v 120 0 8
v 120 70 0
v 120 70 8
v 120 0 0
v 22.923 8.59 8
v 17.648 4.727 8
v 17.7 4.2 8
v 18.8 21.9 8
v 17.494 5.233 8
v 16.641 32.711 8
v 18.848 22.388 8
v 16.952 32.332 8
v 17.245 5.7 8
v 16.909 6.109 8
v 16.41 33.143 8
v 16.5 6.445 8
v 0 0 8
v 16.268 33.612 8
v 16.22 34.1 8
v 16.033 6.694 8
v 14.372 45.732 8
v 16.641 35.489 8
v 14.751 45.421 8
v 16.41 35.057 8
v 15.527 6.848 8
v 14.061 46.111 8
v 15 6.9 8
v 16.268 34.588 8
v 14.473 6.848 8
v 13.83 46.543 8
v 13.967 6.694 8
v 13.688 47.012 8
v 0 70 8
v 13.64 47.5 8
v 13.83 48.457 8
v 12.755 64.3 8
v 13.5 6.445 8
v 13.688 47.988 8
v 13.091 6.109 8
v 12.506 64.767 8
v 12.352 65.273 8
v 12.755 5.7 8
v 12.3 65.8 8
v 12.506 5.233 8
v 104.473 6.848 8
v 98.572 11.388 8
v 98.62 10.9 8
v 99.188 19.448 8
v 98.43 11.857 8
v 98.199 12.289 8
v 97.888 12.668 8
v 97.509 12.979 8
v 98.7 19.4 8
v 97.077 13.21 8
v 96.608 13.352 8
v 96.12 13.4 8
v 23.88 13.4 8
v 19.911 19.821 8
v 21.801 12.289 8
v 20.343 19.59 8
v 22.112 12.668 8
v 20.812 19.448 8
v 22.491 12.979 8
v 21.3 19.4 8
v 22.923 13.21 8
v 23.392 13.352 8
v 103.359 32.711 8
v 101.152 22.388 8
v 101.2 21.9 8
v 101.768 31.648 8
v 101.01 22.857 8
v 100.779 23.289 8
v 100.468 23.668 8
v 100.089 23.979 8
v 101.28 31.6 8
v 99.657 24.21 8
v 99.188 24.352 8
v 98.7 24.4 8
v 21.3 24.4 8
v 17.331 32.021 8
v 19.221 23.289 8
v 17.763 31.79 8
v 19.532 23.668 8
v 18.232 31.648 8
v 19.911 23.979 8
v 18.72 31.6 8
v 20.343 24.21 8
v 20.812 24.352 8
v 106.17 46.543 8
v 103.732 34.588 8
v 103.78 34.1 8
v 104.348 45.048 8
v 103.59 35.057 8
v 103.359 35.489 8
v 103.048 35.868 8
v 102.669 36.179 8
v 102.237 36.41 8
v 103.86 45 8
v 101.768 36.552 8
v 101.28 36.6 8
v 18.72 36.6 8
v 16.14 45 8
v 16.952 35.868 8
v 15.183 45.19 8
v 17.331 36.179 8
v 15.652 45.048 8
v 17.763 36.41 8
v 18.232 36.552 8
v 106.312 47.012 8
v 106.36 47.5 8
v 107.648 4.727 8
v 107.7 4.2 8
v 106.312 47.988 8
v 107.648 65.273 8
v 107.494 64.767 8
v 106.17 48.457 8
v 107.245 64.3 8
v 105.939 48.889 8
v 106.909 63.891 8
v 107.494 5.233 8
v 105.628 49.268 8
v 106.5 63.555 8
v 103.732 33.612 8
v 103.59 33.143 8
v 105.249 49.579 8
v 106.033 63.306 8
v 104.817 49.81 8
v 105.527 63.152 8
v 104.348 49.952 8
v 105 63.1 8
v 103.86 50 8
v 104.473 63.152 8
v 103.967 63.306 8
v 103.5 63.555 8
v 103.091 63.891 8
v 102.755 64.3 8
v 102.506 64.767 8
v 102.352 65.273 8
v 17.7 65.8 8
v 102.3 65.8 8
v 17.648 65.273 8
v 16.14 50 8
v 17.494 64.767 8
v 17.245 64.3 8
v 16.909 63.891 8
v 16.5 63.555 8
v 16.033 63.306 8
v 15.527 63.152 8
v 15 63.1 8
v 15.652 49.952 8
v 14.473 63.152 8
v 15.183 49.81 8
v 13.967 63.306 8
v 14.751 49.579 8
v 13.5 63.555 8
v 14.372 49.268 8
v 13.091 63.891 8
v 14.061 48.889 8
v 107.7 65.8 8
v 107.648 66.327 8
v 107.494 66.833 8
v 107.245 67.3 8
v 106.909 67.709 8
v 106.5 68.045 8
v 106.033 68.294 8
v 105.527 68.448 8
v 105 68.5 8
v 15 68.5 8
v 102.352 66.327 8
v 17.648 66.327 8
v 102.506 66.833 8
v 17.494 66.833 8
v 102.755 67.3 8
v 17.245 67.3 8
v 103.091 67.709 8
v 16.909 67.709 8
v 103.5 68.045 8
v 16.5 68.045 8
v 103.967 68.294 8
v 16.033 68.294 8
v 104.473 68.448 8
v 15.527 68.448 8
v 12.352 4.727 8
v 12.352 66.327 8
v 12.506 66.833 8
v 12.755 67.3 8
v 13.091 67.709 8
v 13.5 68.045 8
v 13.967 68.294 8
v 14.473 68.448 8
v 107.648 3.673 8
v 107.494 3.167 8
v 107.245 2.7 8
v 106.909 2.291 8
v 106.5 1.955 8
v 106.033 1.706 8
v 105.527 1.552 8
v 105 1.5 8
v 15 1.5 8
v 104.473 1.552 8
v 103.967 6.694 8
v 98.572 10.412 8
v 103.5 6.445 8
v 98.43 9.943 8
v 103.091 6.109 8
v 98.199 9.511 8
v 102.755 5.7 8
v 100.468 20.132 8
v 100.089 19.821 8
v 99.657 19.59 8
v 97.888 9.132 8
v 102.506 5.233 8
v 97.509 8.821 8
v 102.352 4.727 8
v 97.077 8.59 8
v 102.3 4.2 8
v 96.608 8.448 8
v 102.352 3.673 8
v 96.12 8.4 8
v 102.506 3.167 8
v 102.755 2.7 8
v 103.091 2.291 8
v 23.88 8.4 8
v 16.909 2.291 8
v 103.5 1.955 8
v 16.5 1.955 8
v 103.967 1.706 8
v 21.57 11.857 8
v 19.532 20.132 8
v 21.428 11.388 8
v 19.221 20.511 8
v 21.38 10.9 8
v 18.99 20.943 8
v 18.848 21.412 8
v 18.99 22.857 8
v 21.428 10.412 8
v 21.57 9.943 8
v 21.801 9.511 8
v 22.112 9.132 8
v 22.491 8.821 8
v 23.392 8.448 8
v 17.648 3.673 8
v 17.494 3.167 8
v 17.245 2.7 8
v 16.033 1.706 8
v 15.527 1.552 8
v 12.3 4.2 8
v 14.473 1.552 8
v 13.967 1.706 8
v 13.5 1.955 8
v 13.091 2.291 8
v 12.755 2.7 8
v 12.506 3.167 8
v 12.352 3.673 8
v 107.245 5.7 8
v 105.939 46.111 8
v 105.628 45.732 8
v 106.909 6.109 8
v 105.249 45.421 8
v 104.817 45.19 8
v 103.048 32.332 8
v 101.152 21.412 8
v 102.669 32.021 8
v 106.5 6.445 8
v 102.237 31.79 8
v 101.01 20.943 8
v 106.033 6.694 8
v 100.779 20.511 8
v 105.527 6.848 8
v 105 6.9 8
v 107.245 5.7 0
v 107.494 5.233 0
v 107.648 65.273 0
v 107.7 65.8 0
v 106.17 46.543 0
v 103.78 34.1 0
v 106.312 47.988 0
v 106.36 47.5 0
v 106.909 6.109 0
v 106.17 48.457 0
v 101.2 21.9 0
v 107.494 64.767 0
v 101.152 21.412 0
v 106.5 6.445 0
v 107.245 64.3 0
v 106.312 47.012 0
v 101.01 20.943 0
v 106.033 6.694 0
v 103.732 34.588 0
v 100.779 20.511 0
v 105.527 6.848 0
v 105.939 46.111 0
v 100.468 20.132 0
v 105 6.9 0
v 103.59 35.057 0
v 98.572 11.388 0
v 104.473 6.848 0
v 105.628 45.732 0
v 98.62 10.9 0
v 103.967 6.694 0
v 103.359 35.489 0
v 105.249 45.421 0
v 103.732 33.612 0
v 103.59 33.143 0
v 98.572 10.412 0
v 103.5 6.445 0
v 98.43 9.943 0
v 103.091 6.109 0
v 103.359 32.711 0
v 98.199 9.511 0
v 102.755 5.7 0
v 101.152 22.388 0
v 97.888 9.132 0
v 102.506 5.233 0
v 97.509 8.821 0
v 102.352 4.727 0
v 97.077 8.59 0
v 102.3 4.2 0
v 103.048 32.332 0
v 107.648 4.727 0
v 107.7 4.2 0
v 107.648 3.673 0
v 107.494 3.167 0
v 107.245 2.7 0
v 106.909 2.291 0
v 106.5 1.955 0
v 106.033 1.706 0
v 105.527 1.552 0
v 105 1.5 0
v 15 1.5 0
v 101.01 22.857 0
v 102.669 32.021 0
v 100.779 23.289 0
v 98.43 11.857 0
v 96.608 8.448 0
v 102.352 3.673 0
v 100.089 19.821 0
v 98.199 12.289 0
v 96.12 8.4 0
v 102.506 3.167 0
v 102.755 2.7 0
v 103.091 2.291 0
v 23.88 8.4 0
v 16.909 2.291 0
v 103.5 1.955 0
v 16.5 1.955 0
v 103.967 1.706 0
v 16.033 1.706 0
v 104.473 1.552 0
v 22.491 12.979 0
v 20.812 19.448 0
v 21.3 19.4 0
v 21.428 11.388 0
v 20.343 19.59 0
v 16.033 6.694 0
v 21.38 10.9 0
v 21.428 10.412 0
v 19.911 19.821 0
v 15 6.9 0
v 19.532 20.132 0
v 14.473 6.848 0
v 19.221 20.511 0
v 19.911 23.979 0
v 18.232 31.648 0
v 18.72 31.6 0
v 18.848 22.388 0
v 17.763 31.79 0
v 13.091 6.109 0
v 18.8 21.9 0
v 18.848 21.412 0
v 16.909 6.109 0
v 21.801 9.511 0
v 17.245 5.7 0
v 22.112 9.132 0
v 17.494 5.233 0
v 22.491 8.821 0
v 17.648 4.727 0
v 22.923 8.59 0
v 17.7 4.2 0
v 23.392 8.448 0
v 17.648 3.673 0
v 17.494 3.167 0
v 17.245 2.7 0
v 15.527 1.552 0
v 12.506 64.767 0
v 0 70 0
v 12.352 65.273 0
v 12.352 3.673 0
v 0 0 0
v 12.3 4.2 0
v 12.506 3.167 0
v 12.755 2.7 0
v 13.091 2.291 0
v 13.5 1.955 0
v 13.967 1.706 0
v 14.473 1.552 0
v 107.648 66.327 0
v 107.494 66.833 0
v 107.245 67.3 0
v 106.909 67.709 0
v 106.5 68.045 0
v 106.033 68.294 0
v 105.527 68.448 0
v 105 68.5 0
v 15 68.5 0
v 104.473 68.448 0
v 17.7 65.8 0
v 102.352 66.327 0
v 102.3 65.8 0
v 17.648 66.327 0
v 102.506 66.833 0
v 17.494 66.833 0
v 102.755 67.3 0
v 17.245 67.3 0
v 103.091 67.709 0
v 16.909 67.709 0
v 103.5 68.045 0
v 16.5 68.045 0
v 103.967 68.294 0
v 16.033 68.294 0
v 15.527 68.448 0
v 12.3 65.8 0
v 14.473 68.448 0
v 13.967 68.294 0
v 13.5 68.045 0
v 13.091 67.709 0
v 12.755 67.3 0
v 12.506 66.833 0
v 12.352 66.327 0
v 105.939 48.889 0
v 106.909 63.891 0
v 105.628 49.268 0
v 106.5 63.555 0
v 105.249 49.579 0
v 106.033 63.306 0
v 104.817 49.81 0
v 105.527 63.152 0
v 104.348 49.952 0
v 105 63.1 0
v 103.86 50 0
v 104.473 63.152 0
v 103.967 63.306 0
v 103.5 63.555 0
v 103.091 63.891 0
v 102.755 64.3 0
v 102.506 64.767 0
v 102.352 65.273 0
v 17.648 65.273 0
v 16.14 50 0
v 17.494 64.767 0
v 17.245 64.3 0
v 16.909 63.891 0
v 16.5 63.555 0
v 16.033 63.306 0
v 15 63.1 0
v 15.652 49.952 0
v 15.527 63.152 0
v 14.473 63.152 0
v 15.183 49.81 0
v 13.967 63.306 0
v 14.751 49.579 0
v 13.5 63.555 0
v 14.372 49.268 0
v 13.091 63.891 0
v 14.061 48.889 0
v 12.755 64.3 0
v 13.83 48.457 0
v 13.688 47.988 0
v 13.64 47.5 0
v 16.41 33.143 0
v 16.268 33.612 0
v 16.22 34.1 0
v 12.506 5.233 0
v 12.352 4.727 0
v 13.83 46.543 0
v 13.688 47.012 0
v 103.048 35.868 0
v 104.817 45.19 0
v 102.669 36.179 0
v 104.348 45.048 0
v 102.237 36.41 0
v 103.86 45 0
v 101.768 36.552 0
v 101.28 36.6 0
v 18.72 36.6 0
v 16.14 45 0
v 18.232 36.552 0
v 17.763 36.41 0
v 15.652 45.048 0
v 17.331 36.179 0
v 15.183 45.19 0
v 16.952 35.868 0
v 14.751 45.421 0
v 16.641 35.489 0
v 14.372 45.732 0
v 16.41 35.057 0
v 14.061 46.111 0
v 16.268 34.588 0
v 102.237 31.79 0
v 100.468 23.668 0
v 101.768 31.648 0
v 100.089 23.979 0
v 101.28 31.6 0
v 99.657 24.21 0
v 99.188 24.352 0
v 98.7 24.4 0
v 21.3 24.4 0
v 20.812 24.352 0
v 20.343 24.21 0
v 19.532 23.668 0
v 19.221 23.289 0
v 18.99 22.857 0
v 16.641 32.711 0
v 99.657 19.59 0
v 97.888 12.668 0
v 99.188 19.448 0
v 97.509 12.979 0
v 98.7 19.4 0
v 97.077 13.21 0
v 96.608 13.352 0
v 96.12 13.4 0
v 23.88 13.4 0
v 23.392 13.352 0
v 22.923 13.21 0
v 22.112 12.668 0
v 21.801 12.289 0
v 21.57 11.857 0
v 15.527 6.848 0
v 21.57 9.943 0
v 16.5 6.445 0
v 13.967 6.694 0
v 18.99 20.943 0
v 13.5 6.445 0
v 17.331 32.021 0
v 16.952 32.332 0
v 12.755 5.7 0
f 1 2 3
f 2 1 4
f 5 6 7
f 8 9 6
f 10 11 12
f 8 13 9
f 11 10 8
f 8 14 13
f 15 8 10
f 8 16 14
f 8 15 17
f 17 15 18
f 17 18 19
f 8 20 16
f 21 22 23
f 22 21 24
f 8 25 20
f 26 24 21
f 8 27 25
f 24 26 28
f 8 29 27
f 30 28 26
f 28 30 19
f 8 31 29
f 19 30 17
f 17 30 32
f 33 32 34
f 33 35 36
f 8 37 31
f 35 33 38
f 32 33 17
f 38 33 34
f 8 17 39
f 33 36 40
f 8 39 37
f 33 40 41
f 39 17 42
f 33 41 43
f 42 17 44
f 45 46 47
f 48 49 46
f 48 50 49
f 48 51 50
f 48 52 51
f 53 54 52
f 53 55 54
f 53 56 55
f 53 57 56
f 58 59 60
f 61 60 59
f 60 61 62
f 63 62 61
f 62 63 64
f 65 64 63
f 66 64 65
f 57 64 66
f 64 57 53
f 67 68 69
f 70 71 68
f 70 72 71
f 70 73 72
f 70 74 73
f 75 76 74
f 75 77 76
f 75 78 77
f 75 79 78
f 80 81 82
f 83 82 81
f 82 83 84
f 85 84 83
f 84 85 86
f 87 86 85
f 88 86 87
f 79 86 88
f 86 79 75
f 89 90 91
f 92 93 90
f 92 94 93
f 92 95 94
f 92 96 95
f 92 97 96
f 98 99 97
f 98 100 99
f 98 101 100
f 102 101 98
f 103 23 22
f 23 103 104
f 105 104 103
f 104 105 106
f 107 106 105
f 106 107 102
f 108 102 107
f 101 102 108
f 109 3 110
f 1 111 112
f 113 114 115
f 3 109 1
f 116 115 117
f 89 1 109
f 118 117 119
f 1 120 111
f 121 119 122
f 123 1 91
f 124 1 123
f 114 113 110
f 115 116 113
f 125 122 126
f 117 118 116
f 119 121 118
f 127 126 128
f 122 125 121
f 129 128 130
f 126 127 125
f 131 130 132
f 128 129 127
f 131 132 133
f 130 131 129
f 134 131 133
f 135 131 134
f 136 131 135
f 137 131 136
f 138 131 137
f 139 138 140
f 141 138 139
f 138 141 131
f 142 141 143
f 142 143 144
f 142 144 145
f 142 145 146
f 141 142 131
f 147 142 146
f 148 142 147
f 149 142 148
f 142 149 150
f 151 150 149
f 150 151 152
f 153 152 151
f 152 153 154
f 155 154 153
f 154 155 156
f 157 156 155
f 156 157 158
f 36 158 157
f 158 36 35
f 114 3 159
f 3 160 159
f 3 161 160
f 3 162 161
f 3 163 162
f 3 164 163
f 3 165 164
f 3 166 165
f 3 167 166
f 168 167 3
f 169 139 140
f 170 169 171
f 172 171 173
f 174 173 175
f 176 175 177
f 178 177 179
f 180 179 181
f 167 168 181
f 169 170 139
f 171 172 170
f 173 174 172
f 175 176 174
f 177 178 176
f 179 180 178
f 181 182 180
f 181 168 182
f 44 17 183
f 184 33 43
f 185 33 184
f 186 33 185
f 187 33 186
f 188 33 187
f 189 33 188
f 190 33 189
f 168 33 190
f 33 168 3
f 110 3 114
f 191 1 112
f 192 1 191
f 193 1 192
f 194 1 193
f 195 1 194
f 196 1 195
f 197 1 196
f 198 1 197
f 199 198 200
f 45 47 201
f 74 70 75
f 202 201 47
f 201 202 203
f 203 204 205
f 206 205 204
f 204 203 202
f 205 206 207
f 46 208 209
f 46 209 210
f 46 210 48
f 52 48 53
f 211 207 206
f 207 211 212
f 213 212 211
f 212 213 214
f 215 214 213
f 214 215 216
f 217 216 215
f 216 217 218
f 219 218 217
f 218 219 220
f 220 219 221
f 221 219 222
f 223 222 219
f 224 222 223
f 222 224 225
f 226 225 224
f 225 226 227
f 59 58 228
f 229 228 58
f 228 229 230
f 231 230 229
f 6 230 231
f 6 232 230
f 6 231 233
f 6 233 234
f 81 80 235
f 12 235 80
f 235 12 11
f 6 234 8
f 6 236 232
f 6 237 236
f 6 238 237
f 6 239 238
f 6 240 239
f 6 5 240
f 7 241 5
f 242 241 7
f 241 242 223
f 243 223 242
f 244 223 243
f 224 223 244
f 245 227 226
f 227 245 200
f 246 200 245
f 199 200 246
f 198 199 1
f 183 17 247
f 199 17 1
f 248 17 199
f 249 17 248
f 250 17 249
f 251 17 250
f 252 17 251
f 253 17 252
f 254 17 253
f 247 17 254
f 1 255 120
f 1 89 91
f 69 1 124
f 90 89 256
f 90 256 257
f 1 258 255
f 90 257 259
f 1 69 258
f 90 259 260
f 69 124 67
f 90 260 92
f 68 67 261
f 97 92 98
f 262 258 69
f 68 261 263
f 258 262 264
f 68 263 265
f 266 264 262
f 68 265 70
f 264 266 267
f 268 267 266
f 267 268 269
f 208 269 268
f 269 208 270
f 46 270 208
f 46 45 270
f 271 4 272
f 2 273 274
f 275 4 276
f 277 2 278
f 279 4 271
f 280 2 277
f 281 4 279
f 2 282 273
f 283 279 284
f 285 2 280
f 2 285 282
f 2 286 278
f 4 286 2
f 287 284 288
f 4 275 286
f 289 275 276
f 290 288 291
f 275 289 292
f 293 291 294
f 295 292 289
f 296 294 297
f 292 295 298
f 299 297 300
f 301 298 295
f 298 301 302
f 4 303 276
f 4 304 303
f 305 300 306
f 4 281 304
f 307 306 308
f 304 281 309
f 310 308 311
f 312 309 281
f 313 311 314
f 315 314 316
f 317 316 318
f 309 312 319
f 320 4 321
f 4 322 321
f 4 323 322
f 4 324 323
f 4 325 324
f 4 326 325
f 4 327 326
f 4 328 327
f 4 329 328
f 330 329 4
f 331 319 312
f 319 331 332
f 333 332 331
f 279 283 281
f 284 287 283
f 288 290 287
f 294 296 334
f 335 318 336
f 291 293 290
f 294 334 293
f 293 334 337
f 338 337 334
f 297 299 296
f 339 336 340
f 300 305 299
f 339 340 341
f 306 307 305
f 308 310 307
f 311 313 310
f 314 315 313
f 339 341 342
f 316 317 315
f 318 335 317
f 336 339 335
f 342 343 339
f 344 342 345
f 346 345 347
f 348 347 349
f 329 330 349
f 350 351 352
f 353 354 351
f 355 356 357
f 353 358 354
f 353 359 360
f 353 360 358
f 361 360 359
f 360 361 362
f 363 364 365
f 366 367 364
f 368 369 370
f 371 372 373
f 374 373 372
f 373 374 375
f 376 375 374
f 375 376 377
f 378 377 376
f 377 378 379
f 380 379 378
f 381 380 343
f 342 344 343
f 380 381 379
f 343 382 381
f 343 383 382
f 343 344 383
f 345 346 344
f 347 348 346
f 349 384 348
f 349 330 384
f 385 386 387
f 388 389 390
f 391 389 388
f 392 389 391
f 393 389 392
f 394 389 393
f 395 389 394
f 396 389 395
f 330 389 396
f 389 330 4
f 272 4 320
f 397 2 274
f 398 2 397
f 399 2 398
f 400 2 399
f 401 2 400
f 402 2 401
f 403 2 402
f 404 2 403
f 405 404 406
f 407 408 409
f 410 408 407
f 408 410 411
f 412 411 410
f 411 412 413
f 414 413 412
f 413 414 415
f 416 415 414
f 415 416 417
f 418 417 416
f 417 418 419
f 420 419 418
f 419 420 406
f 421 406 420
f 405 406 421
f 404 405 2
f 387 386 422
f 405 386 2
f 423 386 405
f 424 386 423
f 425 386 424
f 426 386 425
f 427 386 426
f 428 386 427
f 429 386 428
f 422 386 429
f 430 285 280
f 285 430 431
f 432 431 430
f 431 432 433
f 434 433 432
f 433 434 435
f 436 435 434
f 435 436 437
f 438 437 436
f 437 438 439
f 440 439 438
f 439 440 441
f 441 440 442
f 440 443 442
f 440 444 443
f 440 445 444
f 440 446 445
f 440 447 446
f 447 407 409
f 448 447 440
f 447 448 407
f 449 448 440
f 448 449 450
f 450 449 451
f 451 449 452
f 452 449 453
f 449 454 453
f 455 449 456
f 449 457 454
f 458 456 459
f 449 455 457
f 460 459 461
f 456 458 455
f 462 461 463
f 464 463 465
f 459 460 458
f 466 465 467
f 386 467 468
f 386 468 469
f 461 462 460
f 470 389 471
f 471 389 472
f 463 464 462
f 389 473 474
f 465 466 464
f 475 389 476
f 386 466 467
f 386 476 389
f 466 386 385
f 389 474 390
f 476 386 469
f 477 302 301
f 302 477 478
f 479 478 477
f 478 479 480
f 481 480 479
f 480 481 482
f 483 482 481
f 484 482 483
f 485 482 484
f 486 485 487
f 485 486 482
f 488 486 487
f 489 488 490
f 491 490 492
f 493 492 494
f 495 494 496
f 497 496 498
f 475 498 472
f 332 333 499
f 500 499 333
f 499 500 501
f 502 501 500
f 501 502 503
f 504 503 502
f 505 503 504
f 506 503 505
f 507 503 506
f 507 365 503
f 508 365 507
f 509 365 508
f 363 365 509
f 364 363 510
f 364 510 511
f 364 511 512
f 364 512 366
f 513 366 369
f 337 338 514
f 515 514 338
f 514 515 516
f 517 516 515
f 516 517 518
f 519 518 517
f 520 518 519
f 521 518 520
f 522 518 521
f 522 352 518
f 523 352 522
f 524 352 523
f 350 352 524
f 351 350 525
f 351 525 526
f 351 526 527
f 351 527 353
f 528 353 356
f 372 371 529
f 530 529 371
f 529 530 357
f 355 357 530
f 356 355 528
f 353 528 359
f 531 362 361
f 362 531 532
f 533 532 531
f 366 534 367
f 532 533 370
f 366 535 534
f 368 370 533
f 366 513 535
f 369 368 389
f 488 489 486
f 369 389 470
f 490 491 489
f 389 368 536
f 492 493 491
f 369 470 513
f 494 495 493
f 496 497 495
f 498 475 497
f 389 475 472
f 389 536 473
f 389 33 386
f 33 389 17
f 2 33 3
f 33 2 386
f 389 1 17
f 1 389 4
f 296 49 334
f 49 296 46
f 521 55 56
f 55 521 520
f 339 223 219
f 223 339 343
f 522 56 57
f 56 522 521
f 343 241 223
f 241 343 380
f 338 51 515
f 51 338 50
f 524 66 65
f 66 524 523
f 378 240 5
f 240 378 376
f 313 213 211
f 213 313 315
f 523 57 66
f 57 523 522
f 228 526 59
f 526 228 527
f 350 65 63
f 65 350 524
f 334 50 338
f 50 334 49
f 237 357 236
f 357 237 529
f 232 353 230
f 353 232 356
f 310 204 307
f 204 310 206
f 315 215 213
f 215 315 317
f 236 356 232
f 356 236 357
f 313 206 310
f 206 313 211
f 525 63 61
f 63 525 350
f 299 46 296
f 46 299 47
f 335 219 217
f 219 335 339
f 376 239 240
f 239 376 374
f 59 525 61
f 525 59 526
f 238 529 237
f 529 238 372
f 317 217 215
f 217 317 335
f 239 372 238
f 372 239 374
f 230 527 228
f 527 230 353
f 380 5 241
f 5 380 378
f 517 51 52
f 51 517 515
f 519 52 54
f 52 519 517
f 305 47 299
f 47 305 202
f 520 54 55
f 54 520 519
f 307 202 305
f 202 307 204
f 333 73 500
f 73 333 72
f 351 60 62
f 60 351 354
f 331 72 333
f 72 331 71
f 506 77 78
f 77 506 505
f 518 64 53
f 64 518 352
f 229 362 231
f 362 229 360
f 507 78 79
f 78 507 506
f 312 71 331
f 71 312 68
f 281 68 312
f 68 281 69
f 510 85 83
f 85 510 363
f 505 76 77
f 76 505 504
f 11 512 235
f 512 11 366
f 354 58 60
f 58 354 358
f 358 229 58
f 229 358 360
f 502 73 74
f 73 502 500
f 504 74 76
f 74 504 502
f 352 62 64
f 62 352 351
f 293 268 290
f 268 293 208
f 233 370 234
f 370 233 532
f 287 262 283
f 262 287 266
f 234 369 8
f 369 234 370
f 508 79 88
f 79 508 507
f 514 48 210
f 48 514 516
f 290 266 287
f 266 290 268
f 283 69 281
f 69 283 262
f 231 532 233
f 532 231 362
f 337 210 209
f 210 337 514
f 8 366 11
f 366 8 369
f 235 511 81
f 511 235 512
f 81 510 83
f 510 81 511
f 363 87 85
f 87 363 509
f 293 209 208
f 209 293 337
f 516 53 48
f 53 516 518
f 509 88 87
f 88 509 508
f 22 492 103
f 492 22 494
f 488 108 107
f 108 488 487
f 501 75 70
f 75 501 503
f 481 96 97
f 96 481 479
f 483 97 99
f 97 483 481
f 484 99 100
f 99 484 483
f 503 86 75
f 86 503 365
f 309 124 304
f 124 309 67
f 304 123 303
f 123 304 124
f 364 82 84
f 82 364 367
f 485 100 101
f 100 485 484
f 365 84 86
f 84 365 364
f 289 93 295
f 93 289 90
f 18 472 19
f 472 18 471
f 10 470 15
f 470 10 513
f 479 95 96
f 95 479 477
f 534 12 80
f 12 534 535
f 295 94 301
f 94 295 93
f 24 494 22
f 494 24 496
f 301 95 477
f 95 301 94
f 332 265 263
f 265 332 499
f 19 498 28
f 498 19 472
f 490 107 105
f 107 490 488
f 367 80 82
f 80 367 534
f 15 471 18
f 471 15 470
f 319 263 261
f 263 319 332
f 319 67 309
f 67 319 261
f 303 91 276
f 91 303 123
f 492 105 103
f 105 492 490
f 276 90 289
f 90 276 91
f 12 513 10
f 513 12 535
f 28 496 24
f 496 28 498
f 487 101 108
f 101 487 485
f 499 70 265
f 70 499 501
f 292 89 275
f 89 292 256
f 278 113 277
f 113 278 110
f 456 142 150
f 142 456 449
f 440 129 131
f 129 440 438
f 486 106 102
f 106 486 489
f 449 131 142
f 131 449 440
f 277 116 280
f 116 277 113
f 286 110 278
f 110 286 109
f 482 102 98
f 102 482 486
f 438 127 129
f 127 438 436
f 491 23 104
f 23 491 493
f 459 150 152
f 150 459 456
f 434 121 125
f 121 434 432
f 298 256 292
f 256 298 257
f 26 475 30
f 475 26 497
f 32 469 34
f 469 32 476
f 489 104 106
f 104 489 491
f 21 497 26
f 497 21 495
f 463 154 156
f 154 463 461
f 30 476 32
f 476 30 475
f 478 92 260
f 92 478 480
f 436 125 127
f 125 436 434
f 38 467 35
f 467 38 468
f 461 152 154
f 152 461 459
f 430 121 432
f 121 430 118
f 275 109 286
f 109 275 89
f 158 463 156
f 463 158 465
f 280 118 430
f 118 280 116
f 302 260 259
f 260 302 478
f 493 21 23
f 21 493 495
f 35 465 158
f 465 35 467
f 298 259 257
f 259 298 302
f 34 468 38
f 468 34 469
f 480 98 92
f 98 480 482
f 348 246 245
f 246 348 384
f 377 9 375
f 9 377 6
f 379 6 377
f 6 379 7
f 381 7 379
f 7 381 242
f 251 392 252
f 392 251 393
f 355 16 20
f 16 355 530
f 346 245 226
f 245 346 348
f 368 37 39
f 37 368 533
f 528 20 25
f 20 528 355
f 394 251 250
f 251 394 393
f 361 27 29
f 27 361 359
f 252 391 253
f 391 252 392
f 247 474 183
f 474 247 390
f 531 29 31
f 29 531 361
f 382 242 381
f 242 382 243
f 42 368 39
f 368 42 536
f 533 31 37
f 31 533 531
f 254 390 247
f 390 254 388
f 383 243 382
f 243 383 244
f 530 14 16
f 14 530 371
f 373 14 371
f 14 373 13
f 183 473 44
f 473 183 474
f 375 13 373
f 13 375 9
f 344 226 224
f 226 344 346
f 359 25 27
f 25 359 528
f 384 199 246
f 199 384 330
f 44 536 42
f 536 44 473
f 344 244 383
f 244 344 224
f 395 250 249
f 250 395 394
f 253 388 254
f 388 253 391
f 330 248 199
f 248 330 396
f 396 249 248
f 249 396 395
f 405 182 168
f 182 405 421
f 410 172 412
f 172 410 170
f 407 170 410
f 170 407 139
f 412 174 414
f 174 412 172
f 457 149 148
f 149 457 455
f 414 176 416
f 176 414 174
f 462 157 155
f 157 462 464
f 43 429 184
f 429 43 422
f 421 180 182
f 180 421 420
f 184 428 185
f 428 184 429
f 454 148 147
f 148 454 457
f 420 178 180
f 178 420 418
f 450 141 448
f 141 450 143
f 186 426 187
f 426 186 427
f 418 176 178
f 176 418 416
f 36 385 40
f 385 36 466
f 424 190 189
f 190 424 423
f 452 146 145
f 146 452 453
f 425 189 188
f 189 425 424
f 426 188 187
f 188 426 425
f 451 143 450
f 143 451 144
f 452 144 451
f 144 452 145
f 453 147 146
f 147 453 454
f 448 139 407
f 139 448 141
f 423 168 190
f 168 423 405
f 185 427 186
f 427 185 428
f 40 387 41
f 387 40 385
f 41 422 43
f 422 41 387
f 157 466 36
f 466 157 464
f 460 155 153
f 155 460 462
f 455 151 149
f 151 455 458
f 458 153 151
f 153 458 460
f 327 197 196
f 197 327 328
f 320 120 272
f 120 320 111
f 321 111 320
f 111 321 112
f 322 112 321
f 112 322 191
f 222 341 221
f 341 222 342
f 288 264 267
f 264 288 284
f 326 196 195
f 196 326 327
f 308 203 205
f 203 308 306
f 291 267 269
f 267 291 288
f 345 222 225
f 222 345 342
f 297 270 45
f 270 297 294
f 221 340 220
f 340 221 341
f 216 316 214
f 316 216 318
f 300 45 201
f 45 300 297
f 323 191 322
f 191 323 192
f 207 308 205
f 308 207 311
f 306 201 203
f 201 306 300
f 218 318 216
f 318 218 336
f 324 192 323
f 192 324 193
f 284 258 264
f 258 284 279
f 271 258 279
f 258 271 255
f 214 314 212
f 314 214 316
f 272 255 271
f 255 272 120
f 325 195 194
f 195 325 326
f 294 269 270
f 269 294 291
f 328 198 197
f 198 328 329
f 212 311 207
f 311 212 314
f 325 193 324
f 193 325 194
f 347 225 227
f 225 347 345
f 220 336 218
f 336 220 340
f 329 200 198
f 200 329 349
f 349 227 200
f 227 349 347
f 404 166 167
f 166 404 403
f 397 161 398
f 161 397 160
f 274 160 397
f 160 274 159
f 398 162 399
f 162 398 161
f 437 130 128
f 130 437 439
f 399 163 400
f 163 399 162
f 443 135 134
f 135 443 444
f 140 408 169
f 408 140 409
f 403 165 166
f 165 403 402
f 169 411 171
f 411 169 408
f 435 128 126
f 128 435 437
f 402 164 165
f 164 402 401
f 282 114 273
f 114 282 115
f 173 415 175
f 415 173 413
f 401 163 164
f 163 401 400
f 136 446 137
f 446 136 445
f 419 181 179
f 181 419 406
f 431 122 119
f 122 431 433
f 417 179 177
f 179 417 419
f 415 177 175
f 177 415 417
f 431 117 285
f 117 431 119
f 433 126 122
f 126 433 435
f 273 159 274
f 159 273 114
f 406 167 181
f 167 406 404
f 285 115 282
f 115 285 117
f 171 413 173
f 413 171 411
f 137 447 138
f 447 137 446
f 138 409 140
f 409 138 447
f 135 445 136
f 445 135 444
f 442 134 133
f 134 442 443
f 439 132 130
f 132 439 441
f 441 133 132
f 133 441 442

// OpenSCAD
$fn = 32;

// ----------------------------------------------------------------------
// Slotted panel: 120 x 70 mm, 4 ряда of slots
// ----------------------------------------------------------------------

// --- parameters (mm) ---
panel_w = 120;            // panel width
panel_d = 70;             // panel depth
thick = 8;                // panel thickness
slot_w = 5;               // slot width
pitch0 = 11;              // first row pitch
pitch_step = 1.2;         // pitch increase per row
margin = 8.4;             // margin around the slot field
rows = 4;                 // number of slot rows
mount_d = 5.4;            // mounting holes
mount_x = 45;             // mounting hole offset

difference() {
  union() {
    cube([panel_w, panel_d, thick]);
  }
  /* slot rows: stadium shaped cutters, 2.5 mm clear of both faces */
  /* row 0: pitch 11, length 72.24 */
  hull() {
    translate([23.88, 10.9, -2.5]) cylinder(h = thick + 5, d = slot_w);
    translate([96.12, 10.9, -2.5]) cylinder(h = thick + 5, d = slot_w);
  }
  /* row 1: pitch 12.2, length 77.4 */
  hull() {
    translate([21.3, 21.9, -2.5]) cylinder(h = thick + 5, d = slot_w);
    translate([98.7, 21.9, -2.5]) cylinder(h = thick + 5, d = slot_w);
  }
  /* row 2: pitch 13.4, length 82.56 */
  hull() {
    translate([18.72, 34.1, -2.5]) cylinder(h = thick + 5, d = slot_w);
    translate([101.28, 34.1, -2.5]) cylinder(h = thick + 5, d = slot_w);
  }
  /* row 3: pitch 14.6, length 87.72 */
  hull() {
    translate([16.14, 47.5, -2.5]) cylinder(h = thick + 5, d = slot_w);
    translate([103.86, 47.5, -2.5]) cylinder(h = thick + 5, d = slot_w);
  }
  translate([15, 4.2, -2.5]) cylinder(h = 13, d = mount_d);
  translate([15, 65.8, -2.5]) cylinder(h = 13, d = mount_d);
  translate([105, 4.2, -2.5]) cylinder(h = 13, d = mount_d);
  translate([105, 65.8, -2.5]) cylinder(h = 13, d = mount_d);
}
